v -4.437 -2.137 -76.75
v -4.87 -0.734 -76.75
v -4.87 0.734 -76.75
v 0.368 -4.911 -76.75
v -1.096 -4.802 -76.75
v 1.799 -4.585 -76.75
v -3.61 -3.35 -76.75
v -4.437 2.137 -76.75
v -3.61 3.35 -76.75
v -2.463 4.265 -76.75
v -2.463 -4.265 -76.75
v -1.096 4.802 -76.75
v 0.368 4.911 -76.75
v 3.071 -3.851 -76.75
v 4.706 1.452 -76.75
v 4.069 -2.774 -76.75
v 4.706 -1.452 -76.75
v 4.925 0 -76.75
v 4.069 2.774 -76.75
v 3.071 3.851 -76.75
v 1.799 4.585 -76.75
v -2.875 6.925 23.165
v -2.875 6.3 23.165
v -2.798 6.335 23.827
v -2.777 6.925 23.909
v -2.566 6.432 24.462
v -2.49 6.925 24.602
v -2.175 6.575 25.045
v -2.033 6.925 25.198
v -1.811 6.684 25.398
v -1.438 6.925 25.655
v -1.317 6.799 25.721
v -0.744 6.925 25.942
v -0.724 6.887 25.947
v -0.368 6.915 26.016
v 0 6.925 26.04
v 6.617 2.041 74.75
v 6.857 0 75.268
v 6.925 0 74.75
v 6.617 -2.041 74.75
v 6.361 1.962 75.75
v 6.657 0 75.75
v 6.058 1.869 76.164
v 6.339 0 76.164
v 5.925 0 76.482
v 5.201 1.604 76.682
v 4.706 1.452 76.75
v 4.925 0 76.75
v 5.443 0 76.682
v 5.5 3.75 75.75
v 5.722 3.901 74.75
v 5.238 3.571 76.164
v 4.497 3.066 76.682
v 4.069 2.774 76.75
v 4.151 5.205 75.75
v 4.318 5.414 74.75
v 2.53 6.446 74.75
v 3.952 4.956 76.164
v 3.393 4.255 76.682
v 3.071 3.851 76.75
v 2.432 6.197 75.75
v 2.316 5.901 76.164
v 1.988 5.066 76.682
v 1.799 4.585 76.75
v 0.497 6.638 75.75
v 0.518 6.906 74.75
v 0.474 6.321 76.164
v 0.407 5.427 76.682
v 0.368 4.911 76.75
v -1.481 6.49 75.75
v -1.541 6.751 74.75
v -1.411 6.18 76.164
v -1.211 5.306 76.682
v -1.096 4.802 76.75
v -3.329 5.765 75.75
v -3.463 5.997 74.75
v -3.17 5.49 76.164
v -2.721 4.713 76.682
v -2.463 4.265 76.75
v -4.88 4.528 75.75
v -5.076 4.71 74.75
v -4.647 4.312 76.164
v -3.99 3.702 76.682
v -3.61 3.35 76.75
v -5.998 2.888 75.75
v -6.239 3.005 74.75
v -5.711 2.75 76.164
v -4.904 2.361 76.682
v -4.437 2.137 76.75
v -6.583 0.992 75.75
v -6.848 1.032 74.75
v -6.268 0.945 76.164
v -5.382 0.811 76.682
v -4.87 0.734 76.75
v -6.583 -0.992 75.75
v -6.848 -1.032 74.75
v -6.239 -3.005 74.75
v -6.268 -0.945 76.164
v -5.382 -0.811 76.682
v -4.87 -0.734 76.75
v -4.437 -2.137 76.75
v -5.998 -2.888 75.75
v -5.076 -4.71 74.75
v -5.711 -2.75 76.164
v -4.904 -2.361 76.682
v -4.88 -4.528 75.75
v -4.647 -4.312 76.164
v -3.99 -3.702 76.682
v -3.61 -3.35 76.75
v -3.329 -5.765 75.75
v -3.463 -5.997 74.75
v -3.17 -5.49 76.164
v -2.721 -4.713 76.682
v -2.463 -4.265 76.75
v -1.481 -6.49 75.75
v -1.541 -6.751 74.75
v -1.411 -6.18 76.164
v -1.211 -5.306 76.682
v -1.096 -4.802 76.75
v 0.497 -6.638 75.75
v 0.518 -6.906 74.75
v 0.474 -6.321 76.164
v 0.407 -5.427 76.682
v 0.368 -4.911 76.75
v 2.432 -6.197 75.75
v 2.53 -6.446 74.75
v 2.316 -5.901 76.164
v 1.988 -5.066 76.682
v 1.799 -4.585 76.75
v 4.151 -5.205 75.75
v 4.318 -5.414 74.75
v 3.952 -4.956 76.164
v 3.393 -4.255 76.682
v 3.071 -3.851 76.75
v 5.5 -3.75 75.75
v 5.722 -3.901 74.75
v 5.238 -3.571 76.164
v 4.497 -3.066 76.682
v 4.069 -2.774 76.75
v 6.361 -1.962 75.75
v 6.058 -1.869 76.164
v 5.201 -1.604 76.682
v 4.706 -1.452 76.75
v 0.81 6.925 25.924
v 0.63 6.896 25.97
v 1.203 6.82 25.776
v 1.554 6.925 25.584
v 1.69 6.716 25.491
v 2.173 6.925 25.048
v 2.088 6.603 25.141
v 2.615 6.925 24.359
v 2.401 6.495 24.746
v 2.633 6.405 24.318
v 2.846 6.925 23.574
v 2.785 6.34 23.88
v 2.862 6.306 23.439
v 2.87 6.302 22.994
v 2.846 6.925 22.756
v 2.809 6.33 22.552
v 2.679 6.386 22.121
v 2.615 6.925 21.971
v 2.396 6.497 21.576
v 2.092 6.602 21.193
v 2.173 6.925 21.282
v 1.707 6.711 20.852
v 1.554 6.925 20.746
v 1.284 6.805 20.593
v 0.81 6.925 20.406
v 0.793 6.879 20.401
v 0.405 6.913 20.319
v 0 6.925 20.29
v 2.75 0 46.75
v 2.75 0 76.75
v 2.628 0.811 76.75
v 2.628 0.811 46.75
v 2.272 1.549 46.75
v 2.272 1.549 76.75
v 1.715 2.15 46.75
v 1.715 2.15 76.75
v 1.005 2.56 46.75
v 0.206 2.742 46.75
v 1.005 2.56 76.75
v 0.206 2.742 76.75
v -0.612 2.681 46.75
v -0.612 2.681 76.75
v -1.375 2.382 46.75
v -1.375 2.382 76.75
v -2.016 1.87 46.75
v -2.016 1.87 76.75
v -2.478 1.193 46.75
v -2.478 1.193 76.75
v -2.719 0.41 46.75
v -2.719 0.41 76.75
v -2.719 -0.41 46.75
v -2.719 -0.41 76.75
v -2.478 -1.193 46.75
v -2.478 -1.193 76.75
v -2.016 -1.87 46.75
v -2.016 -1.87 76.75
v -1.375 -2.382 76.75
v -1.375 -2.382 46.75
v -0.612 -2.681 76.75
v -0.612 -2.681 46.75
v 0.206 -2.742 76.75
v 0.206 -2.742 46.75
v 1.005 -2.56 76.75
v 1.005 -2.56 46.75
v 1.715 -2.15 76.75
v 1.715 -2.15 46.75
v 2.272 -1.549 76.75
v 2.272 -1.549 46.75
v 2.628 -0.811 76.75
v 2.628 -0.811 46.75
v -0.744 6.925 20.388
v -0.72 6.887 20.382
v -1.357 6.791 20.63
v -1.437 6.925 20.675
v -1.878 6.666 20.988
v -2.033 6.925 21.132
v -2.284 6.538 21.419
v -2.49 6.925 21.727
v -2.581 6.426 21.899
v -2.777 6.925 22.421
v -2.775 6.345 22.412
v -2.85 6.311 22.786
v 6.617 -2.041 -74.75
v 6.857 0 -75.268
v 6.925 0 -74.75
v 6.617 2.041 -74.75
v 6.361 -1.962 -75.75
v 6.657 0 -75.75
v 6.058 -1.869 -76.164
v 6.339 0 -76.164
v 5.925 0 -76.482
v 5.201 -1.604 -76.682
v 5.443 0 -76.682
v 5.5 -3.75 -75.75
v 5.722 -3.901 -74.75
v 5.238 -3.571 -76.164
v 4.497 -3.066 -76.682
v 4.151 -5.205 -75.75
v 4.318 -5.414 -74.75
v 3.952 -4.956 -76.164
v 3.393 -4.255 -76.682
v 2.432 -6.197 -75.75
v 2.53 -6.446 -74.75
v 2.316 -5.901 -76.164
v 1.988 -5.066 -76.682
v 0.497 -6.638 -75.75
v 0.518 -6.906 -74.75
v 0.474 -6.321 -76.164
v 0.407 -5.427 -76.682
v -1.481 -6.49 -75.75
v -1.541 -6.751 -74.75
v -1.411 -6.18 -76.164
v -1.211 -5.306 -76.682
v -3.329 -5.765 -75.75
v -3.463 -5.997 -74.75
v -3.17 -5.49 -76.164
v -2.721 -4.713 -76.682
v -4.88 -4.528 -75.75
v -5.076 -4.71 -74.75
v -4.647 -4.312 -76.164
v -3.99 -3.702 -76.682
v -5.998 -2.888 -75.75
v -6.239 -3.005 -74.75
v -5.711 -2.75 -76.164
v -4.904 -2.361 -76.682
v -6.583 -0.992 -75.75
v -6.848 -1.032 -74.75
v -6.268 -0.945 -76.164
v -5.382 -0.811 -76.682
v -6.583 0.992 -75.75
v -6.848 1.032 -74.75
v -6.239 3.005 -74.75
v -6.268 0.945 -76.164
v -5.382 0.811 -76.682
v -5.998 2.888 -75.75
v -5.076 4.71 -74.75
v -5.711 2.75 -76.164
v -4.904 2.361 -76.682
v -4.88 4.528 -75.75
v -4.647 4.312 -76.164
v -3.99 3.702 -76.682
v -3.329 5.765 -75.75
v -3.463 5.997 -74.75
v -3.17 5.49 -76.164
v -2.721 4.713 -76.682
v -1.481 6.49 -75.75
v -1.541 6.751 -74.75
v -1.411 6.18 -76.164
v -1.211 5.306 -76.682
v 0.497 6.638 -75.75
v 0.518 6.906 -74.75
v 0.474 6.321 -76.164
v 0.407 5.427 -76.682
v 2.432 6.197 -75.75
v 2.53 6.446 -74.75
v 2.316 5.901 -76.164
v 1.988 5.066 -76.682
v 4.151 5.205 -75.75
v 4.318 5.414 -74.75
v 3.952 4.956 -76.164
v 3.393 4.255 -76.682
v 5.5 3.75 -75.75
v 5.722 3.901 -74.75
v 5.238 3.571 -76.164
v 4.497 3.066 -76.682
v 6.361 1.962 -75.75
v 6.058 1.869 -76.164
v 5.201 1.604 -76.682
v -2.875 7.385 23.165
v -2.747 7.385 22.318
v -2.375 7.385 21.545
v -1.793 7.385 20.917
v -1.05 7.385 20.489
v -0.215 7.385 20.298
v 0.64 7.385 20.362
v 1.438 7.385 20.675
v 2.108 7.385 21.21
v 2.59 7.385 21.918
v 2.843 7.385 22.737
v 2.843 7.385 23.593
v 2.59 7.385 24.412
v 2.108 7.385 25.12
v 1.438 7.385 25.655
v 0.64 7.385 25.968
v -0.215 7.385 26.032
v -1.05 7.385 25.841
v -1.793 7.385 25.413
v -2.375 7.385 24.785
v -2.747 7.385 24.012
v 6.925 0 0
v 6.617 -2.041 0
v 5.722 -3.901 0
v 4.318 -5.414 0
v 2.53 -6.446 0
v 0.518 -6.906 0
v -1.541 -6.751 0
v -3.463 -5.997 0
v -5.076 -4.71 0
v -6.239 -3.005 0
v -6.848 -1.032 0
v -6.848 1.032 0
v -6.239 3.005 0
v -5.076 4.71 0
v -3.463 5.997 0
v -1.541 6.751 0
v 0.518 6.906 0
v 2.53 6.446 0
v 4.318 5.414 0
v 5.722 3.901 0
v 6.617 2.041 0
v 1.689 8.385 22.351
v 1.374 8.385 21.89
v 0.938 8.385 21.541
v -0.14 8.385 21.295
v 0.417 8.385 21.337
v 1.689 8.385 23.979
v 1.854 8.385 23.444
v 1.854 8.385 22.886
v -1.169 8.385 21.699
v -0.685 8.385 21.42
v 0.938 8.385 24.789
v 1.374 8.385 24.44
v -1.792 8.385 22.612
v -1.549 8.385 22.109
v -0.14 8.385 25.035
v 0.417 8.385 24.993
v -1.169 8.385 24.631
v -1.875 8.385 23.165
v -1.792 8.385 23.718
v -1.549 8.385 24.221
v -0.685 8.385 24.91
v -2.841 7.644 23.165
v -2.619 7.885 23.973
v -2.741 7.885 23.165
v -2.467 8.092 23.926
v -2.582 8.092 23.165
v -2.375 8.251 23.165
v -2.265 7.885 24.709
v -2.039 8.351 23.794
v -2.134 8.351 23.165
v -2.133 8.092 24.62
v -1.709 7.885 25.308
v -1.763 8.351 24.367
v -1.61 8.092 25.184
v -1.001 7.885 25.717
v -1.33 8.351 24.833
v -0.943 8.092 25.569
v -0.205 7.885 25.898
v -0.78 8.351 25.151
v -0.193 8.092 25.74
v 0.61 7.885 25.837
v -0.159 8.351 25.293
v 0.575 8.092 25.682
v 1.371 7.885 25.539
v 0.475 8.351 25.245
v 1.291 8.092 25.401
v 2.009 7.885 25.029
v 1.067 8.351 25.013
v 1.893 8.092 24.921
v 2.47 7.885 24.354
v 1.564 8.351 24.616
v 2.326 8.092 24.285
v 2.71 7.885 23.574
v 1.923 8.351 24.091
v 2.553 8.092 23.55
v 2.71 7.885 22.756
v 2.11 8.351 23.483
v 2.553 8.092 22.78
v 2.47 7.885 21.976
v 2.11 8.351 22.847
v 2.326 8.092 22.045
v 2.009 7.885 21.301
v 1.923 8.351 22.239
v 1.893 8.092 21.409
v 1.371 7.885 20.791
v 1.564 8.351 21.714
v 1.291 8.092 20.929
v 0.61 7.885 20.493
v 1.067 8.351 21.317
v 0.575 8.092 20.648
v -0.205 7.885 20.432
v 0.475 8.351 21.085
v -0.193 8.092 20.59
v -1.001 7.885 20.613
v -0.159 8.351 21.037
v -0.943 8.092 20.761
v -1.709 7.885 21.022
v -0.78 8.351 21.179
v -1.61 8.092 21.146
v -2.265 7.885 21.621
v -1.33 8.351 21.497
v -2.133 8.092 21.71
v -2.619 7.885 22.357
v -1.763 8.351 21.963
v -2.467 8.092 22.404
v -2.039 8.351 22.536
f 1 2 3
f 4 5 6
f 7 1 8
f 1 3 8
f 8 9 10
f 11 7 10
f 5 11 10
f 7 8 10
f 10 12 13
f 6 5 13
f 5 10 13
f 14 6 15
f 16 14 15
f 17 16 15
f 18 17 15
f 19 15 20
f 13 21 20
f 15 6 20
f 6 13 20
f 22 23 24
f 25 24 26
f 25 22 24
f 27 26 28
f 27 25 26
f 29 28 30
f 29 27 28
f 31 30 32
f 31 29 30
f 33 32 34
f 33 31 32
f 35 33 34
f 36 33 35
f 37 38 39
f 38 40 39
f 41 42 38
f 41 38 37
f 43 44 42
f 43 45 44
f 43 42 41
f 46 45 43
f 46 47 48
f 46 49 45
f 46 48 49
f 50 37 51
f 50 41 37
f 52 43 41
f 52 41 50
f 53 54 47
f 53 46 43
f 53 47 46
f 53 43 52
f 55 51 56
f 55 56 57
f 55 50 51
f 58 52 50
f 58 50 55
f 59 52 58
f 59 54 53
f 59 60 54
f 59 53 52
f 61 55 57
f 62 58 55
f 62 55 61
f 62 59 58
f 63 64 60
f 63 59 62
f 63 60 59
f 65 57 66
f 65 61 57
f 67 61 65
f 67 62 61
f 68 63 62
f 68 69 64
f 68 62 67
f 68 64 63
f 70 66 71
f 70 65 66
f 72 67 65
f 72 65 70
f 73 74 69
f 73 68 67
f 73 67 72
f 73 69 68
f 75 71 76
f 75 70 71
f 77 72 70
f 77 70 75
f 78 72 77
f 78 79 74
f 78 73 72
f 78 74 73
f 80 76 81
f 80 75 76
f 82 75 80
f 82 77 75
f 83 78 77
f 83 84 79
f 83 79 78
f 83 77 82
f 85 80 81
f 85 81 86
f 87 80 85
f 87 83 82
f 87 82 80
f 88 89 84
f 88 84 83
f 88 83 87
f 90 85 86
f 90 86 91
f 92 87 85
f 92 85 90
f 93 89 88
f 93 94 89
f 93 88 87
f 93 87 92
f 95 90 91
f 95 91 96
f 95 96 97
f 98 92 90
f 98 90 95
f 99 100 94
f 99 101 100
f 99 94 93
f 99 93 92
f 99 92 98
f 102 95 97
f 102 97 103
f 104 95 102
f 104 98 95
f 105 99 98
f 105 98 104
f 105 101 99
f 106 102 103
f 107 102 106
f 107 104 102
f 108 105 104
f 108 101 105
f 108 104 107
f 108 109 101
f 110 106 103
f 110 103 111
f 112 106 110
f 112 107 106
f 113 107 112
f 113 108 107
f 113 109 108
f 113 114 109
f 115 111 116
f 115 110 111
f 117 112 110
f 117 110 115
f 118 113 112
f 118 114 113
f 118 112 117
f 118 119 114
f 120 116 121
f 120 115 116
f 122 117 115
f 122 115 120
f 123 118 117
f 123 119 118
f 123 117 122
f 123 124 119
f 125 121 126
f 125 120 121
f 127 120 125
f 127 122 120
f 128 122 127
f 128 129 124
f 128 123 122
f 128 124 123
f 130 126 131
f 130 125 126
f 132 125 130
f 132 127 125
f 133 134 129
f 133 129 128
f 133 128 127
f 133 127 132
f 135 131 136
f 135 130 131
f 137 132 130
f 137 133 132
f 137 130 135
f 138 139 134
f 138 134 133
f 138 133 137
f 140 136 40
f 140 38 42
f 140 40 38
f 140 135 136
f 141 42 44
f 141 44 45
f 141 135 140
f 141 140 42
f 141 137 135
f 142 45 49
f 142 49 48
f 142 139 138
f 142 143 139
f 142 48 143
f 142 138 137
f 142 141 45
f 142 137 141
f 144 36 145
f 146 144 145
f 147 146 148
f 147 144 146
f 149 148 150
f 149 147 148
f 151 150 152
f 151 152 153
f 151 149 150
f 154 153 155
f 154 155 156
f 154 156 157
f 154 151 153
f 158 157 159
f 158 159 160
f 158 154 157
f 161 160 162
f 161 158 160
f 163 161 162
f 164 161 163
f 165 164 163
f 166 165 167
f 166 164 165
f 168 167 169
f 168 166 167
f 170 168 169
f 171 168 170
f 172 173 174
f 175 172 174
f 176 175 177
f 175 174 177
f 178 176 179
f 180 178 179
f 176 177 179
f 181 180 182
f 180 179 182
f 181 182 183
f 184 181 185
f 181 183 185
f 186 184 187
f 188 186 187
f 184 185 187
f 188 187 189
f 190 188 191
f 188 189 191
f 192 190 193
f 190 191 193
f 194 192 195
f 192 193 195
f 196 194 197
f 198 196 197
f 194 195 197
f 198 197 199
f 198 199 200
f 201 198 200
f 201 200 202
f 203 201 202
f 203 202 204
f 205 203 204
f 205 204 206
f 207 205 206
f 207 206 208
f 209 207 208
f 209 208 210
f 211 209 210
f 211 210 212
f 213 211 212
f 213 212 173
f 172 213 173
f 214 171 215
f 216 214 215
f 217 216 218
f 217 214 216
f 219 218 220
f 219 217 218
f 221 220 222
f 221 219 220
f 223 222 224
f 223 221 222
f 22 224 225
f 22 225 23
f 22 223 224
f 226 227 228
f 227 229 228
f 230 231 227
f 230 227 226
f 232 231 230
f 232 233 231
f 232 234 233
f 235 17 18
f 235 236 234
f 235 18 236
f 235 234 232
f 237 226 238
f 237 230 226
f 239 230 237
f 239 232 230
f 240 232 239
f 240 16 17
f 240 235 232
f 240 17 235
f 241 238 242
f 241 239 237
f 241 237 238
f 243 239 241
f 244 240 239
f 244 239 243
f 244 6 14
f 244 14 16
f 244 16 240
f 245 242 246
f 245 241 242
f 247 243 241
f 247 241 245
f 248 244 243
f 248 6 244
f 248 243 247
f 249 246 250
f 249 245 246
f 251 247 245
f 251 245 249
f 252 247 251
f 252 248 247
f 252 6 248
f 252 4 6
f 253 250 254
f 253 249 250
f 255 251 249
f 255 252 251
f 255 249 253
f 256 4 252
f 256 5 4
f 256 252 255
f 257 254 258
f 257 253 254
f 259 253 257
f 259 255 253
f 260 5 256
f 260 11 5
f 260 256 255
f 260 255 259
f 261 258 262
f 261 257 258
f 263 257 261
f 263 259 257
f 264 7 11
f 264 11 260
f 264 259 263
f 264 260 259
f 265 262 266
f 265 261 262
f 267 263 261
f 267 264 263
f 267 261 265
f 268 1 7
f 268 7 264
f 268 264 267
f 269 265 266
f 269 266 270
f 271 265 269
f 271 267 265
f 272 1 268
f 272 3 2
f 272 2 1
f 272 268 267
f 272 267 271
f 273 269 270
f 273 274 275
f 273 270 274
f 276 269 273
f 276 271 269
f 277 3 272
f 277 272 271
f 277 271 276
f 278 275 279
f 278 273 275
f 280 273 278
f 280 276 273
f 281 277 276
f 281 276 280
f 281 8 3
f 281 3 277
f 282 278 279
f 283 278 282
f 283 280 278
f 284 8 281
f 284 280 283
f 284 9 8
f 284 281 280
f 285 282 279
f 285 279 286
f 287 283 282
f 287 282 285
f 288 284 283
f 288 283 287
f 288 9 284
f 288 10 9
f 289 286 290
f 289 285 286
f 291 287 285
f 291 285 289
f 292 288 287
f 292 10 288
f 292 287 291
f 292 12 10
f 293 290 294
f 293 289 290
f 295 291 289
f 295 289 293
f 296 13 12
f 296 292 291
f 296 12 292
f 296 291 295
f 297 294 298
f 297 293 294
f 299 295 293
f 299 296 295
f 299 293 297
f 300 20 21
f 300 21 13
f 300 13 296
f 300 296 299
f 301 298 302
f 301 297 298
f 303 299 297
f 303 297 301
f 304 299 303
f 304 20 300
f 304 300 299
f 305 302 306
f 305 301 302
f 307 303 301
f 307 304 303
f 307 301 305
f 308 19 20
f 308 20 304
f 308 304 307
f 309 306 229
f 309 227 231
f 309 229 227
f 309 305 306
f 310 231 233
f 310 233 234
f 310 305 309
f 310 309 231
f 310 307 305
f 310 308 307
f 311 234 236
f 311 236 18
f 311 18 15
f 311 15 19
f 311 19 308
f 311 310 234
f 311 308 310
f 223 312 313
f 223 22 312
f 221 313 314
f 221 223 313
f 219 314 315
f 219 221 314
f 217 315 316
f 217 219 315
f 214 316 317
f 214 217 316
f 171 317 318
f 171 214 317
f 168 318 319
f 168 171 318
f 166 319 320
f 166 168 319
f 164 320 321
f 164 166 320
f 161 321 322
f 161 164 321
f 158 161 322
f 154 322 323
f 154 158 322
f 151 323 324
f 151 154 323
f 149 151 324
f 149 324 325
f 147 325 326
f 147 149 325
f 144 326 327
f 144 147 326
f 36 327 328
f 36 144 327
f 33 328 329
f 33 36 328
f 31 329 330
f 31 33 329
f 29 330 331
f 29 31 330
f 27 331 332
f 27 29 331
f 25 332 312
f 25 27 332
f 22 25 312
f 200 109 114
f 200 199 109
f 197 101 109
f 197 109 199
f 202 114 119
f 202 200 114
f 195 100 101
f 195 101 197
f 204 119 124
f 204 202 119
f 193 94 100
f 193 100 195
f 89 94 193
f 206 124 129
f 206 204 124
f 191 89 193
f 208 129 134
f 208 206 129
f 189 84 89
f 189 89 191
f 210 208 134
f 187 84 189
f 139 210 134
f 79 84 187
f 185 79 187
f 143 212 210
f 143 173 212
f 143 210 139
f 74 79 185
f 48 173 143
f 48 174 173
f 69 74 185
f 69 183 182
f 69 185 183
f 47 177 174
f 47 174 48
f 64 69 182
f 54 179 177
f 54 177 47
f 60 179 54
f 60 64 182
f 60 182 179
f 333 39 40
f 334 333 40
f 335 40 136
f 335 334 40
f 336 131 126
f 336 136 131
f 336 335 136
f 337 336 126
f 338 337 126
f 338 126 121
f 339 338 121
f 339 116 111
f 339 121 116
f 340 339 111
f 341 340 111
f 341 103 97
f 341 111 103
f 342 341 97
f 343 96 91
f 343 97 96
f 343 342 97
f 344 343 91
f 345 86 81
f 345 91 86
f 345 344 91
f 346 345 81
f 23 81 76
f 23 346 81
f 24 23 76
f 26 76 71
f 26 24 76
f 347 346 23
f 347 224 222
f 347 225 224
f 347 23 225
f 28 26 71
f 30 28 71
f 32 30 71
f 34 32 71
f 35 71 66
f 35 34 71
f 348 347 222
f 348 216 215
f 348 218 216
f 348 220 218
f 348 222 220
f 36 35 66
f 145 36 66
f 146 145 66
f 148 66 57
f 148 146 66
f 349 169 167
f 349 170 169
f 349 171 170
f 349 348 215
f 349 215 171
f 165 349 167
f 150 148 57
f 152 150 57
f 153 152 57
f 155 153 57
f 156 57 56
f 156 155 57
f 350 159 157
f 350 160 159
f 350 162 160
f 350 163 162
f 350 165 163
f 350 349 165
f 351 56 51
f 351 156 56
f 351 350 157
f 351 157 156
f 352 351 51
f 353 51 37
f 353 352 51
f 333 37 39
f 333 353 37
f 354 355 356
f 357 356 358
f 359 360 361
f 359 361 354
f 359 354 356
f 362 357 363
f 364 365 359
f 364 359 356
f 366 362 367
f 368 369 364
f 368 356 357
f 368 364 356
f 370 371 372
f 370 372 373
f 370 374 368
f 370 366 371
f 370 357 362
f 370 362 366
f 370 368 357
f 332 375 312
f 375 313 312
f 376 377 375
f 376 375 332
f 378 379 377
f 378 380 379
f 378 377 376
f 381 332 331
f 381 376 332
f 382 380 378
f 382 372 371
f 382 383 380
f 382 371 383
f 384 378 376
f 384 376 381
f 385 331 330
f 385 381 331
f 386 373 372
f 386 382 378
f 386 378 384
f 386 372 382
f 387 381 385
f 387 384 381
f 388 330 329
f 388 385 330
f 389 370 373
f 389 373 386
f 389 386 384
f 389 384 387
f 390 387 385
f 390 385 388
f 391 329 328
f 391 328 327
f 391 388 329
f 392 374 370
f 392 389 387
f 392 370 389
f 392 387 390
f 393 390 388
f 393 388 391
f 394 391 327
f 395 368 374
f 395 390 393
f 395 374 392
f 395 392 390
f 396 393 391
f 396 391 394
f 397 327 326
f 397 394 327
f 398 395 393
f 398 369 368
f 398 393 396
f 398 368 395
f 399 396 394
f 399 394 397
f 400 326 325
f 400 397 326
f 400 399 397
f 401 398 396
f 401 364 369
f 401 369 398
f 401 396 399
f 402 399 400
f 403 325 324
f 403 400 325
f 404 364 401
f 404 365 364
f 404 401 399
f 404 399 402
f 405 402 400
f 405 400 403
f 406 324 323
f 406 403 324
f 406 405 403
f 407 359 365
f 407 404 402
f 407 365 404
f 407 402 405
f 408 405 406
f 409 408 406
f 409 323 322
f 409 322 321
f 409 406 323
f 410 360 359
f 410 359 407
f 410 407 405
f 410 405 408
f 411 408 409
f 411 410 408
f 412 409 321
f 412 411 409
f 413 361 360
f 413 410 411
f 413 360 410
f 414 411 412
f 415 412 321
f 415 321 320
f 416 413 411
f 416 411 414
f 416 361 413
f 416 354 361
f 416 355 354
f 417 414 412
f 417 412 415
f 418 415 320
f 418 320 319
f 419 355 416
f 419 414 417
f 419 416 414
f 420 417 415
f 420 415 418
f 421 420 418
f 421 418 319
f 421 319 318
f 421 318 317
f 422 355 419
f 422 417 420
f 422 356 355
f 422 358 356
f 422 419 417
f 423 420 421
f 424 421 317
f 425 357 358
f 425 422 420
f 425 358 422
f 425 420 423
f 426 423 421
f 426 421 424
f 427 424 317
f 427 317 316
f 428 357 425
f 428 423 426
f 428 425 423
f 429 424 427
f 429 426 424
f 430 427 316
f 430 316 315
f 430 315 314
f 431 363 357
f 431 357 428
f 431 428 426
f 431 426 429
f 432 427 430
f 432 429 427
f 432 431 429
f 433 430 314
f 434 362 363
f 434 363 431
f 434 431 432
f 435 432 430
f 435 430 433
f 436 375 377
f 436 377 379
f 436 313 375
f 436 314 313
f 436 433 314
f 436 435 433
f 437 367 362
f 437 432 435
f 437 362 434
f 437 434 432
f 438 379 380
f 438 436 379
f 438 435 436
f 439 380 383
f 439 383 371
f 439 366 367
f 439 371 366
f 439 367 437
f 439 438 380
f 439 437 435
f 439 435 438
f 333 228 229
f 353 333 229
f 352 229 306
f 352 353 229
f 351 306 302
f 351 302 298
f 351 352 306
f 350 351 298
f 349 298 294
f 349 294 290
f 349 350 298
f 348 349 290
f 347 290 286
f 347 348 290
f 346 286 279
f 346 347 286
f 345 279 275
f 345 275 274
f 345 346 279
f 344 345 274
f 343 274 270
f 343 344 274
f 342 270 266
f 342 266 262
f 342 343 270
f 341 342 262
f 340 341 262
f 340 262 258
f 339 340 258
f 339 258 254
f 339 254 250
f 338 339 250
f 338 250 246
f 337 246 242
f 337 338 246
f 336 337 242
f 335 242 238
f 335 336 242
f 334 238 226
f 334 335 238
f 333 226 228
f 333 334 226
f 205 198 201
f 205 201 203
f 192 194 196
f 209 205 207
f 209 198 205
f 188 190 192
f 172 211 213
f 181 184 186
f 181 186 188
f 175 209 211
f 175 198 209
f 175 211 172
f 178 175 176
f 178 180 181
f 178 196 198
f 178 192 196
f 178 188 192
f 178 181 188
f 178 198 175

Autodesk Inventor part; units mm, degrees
ref_plane "YZ Plane" through (0, 0, 0) normal (1, 0, 0) x (0, 1, 0)
ref_plane "XZ Plane" through (0, 0, 0) normal (0, 1, 0) x (-1, 0, 0)
ref_plane "XY Plane" through (0, 0, 0) normal (0, 0, 1) x (1, 0, 0)
sketch "Sketch1" plane through (0, 0, 0) normal (0, 0, 1) x (1, 0, 0)
  circle A0 centre (0, 0) radius 6.925
  dimension "d0" = 13.85
extrude "Extrusion1" add sketch "Sketch1" along normal mid plane 153.5
sketch "Sketch2" plane through (0, 0, 76.75) normal (0, 0, 1) x (1, 0, 0)
  circle A0 centre (0, 0) radius 6.925 projected
  point P0 (0, 6.925)
ref_plane "Work Plane1" through (0, 6.925, 76.75) normal (0, 1, 0) x (-1, 0, 0)
sketch "Sketch3" plane through (0, 6.925, 76.75) normal (0, 1, 0) x (-1, 0, 0)
  circle A0 centre (0, -53.585) radius 2.875
  line L0 (6.925, 0) -> (-6.925, 0) projected
  point P0 (0, -76.75)
  dimension "d3" = 50.71
  dimension "d4" = 5.75
extrude "Extrusion2" add sketch "Sketch3" along normal mid plane 2.92
fillet "Fillet1" radius 1 1 edges at (2.875, 8.385, 23.165)
sketch "Sketch4" plane through (0, 0, 76.75) normal (0, 0, 1) x (1, 0, 0)
  circle A0 centre (0, 0) radius 2.75
  dimension "d8" = 5.5
extrude "Extrusion3" cut sketch "Sketch4" against normal blind 30
fillet "Fillet2" radius 2 2 edges at (-6.925, 0, 76.75) (-6.925, 0, -76.75)
properties part number "Pen_Model"
